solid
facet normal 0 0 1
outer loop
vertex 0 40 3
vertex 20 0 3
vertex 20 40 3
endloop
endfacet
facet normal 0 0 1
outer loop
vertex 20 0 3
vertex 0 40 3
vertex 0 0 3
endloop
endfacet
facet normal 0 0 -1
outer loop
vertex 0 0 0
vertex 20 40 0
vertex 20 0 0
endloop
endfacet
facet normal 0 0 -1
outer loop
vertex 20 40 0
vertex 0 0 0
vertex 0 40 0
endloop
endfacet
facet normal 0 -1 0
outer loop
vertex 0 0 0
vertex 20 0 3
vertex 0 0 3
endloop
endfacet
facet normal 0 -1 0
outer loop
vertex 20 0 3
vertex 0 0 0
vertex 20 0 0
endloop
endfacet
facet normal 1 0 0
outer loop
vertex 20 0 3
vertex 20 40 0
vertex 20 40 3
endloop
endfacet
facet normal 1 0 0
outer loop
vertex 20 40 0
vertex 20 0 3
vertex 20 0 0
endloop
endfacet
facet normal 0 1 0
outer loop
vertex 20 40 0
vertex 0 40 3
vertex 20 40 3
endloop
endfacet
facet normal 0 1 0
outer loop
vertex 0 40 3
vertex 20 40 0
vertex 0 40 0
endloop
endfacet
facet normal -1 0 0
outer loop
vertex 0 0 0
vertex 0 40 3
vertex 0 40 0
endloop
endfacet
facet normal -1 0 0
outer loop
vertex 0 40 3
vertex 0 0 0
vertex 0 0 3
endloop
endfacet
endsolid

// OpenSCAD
module panel(length, width, thickness, material, color="brown") {
    color(color) cube([length, width, thickness]);
    echo(material="<b>panel</b>", length, width, thickness, material, color);
}

panel(20, 40, 3, "phenol", "blue");
